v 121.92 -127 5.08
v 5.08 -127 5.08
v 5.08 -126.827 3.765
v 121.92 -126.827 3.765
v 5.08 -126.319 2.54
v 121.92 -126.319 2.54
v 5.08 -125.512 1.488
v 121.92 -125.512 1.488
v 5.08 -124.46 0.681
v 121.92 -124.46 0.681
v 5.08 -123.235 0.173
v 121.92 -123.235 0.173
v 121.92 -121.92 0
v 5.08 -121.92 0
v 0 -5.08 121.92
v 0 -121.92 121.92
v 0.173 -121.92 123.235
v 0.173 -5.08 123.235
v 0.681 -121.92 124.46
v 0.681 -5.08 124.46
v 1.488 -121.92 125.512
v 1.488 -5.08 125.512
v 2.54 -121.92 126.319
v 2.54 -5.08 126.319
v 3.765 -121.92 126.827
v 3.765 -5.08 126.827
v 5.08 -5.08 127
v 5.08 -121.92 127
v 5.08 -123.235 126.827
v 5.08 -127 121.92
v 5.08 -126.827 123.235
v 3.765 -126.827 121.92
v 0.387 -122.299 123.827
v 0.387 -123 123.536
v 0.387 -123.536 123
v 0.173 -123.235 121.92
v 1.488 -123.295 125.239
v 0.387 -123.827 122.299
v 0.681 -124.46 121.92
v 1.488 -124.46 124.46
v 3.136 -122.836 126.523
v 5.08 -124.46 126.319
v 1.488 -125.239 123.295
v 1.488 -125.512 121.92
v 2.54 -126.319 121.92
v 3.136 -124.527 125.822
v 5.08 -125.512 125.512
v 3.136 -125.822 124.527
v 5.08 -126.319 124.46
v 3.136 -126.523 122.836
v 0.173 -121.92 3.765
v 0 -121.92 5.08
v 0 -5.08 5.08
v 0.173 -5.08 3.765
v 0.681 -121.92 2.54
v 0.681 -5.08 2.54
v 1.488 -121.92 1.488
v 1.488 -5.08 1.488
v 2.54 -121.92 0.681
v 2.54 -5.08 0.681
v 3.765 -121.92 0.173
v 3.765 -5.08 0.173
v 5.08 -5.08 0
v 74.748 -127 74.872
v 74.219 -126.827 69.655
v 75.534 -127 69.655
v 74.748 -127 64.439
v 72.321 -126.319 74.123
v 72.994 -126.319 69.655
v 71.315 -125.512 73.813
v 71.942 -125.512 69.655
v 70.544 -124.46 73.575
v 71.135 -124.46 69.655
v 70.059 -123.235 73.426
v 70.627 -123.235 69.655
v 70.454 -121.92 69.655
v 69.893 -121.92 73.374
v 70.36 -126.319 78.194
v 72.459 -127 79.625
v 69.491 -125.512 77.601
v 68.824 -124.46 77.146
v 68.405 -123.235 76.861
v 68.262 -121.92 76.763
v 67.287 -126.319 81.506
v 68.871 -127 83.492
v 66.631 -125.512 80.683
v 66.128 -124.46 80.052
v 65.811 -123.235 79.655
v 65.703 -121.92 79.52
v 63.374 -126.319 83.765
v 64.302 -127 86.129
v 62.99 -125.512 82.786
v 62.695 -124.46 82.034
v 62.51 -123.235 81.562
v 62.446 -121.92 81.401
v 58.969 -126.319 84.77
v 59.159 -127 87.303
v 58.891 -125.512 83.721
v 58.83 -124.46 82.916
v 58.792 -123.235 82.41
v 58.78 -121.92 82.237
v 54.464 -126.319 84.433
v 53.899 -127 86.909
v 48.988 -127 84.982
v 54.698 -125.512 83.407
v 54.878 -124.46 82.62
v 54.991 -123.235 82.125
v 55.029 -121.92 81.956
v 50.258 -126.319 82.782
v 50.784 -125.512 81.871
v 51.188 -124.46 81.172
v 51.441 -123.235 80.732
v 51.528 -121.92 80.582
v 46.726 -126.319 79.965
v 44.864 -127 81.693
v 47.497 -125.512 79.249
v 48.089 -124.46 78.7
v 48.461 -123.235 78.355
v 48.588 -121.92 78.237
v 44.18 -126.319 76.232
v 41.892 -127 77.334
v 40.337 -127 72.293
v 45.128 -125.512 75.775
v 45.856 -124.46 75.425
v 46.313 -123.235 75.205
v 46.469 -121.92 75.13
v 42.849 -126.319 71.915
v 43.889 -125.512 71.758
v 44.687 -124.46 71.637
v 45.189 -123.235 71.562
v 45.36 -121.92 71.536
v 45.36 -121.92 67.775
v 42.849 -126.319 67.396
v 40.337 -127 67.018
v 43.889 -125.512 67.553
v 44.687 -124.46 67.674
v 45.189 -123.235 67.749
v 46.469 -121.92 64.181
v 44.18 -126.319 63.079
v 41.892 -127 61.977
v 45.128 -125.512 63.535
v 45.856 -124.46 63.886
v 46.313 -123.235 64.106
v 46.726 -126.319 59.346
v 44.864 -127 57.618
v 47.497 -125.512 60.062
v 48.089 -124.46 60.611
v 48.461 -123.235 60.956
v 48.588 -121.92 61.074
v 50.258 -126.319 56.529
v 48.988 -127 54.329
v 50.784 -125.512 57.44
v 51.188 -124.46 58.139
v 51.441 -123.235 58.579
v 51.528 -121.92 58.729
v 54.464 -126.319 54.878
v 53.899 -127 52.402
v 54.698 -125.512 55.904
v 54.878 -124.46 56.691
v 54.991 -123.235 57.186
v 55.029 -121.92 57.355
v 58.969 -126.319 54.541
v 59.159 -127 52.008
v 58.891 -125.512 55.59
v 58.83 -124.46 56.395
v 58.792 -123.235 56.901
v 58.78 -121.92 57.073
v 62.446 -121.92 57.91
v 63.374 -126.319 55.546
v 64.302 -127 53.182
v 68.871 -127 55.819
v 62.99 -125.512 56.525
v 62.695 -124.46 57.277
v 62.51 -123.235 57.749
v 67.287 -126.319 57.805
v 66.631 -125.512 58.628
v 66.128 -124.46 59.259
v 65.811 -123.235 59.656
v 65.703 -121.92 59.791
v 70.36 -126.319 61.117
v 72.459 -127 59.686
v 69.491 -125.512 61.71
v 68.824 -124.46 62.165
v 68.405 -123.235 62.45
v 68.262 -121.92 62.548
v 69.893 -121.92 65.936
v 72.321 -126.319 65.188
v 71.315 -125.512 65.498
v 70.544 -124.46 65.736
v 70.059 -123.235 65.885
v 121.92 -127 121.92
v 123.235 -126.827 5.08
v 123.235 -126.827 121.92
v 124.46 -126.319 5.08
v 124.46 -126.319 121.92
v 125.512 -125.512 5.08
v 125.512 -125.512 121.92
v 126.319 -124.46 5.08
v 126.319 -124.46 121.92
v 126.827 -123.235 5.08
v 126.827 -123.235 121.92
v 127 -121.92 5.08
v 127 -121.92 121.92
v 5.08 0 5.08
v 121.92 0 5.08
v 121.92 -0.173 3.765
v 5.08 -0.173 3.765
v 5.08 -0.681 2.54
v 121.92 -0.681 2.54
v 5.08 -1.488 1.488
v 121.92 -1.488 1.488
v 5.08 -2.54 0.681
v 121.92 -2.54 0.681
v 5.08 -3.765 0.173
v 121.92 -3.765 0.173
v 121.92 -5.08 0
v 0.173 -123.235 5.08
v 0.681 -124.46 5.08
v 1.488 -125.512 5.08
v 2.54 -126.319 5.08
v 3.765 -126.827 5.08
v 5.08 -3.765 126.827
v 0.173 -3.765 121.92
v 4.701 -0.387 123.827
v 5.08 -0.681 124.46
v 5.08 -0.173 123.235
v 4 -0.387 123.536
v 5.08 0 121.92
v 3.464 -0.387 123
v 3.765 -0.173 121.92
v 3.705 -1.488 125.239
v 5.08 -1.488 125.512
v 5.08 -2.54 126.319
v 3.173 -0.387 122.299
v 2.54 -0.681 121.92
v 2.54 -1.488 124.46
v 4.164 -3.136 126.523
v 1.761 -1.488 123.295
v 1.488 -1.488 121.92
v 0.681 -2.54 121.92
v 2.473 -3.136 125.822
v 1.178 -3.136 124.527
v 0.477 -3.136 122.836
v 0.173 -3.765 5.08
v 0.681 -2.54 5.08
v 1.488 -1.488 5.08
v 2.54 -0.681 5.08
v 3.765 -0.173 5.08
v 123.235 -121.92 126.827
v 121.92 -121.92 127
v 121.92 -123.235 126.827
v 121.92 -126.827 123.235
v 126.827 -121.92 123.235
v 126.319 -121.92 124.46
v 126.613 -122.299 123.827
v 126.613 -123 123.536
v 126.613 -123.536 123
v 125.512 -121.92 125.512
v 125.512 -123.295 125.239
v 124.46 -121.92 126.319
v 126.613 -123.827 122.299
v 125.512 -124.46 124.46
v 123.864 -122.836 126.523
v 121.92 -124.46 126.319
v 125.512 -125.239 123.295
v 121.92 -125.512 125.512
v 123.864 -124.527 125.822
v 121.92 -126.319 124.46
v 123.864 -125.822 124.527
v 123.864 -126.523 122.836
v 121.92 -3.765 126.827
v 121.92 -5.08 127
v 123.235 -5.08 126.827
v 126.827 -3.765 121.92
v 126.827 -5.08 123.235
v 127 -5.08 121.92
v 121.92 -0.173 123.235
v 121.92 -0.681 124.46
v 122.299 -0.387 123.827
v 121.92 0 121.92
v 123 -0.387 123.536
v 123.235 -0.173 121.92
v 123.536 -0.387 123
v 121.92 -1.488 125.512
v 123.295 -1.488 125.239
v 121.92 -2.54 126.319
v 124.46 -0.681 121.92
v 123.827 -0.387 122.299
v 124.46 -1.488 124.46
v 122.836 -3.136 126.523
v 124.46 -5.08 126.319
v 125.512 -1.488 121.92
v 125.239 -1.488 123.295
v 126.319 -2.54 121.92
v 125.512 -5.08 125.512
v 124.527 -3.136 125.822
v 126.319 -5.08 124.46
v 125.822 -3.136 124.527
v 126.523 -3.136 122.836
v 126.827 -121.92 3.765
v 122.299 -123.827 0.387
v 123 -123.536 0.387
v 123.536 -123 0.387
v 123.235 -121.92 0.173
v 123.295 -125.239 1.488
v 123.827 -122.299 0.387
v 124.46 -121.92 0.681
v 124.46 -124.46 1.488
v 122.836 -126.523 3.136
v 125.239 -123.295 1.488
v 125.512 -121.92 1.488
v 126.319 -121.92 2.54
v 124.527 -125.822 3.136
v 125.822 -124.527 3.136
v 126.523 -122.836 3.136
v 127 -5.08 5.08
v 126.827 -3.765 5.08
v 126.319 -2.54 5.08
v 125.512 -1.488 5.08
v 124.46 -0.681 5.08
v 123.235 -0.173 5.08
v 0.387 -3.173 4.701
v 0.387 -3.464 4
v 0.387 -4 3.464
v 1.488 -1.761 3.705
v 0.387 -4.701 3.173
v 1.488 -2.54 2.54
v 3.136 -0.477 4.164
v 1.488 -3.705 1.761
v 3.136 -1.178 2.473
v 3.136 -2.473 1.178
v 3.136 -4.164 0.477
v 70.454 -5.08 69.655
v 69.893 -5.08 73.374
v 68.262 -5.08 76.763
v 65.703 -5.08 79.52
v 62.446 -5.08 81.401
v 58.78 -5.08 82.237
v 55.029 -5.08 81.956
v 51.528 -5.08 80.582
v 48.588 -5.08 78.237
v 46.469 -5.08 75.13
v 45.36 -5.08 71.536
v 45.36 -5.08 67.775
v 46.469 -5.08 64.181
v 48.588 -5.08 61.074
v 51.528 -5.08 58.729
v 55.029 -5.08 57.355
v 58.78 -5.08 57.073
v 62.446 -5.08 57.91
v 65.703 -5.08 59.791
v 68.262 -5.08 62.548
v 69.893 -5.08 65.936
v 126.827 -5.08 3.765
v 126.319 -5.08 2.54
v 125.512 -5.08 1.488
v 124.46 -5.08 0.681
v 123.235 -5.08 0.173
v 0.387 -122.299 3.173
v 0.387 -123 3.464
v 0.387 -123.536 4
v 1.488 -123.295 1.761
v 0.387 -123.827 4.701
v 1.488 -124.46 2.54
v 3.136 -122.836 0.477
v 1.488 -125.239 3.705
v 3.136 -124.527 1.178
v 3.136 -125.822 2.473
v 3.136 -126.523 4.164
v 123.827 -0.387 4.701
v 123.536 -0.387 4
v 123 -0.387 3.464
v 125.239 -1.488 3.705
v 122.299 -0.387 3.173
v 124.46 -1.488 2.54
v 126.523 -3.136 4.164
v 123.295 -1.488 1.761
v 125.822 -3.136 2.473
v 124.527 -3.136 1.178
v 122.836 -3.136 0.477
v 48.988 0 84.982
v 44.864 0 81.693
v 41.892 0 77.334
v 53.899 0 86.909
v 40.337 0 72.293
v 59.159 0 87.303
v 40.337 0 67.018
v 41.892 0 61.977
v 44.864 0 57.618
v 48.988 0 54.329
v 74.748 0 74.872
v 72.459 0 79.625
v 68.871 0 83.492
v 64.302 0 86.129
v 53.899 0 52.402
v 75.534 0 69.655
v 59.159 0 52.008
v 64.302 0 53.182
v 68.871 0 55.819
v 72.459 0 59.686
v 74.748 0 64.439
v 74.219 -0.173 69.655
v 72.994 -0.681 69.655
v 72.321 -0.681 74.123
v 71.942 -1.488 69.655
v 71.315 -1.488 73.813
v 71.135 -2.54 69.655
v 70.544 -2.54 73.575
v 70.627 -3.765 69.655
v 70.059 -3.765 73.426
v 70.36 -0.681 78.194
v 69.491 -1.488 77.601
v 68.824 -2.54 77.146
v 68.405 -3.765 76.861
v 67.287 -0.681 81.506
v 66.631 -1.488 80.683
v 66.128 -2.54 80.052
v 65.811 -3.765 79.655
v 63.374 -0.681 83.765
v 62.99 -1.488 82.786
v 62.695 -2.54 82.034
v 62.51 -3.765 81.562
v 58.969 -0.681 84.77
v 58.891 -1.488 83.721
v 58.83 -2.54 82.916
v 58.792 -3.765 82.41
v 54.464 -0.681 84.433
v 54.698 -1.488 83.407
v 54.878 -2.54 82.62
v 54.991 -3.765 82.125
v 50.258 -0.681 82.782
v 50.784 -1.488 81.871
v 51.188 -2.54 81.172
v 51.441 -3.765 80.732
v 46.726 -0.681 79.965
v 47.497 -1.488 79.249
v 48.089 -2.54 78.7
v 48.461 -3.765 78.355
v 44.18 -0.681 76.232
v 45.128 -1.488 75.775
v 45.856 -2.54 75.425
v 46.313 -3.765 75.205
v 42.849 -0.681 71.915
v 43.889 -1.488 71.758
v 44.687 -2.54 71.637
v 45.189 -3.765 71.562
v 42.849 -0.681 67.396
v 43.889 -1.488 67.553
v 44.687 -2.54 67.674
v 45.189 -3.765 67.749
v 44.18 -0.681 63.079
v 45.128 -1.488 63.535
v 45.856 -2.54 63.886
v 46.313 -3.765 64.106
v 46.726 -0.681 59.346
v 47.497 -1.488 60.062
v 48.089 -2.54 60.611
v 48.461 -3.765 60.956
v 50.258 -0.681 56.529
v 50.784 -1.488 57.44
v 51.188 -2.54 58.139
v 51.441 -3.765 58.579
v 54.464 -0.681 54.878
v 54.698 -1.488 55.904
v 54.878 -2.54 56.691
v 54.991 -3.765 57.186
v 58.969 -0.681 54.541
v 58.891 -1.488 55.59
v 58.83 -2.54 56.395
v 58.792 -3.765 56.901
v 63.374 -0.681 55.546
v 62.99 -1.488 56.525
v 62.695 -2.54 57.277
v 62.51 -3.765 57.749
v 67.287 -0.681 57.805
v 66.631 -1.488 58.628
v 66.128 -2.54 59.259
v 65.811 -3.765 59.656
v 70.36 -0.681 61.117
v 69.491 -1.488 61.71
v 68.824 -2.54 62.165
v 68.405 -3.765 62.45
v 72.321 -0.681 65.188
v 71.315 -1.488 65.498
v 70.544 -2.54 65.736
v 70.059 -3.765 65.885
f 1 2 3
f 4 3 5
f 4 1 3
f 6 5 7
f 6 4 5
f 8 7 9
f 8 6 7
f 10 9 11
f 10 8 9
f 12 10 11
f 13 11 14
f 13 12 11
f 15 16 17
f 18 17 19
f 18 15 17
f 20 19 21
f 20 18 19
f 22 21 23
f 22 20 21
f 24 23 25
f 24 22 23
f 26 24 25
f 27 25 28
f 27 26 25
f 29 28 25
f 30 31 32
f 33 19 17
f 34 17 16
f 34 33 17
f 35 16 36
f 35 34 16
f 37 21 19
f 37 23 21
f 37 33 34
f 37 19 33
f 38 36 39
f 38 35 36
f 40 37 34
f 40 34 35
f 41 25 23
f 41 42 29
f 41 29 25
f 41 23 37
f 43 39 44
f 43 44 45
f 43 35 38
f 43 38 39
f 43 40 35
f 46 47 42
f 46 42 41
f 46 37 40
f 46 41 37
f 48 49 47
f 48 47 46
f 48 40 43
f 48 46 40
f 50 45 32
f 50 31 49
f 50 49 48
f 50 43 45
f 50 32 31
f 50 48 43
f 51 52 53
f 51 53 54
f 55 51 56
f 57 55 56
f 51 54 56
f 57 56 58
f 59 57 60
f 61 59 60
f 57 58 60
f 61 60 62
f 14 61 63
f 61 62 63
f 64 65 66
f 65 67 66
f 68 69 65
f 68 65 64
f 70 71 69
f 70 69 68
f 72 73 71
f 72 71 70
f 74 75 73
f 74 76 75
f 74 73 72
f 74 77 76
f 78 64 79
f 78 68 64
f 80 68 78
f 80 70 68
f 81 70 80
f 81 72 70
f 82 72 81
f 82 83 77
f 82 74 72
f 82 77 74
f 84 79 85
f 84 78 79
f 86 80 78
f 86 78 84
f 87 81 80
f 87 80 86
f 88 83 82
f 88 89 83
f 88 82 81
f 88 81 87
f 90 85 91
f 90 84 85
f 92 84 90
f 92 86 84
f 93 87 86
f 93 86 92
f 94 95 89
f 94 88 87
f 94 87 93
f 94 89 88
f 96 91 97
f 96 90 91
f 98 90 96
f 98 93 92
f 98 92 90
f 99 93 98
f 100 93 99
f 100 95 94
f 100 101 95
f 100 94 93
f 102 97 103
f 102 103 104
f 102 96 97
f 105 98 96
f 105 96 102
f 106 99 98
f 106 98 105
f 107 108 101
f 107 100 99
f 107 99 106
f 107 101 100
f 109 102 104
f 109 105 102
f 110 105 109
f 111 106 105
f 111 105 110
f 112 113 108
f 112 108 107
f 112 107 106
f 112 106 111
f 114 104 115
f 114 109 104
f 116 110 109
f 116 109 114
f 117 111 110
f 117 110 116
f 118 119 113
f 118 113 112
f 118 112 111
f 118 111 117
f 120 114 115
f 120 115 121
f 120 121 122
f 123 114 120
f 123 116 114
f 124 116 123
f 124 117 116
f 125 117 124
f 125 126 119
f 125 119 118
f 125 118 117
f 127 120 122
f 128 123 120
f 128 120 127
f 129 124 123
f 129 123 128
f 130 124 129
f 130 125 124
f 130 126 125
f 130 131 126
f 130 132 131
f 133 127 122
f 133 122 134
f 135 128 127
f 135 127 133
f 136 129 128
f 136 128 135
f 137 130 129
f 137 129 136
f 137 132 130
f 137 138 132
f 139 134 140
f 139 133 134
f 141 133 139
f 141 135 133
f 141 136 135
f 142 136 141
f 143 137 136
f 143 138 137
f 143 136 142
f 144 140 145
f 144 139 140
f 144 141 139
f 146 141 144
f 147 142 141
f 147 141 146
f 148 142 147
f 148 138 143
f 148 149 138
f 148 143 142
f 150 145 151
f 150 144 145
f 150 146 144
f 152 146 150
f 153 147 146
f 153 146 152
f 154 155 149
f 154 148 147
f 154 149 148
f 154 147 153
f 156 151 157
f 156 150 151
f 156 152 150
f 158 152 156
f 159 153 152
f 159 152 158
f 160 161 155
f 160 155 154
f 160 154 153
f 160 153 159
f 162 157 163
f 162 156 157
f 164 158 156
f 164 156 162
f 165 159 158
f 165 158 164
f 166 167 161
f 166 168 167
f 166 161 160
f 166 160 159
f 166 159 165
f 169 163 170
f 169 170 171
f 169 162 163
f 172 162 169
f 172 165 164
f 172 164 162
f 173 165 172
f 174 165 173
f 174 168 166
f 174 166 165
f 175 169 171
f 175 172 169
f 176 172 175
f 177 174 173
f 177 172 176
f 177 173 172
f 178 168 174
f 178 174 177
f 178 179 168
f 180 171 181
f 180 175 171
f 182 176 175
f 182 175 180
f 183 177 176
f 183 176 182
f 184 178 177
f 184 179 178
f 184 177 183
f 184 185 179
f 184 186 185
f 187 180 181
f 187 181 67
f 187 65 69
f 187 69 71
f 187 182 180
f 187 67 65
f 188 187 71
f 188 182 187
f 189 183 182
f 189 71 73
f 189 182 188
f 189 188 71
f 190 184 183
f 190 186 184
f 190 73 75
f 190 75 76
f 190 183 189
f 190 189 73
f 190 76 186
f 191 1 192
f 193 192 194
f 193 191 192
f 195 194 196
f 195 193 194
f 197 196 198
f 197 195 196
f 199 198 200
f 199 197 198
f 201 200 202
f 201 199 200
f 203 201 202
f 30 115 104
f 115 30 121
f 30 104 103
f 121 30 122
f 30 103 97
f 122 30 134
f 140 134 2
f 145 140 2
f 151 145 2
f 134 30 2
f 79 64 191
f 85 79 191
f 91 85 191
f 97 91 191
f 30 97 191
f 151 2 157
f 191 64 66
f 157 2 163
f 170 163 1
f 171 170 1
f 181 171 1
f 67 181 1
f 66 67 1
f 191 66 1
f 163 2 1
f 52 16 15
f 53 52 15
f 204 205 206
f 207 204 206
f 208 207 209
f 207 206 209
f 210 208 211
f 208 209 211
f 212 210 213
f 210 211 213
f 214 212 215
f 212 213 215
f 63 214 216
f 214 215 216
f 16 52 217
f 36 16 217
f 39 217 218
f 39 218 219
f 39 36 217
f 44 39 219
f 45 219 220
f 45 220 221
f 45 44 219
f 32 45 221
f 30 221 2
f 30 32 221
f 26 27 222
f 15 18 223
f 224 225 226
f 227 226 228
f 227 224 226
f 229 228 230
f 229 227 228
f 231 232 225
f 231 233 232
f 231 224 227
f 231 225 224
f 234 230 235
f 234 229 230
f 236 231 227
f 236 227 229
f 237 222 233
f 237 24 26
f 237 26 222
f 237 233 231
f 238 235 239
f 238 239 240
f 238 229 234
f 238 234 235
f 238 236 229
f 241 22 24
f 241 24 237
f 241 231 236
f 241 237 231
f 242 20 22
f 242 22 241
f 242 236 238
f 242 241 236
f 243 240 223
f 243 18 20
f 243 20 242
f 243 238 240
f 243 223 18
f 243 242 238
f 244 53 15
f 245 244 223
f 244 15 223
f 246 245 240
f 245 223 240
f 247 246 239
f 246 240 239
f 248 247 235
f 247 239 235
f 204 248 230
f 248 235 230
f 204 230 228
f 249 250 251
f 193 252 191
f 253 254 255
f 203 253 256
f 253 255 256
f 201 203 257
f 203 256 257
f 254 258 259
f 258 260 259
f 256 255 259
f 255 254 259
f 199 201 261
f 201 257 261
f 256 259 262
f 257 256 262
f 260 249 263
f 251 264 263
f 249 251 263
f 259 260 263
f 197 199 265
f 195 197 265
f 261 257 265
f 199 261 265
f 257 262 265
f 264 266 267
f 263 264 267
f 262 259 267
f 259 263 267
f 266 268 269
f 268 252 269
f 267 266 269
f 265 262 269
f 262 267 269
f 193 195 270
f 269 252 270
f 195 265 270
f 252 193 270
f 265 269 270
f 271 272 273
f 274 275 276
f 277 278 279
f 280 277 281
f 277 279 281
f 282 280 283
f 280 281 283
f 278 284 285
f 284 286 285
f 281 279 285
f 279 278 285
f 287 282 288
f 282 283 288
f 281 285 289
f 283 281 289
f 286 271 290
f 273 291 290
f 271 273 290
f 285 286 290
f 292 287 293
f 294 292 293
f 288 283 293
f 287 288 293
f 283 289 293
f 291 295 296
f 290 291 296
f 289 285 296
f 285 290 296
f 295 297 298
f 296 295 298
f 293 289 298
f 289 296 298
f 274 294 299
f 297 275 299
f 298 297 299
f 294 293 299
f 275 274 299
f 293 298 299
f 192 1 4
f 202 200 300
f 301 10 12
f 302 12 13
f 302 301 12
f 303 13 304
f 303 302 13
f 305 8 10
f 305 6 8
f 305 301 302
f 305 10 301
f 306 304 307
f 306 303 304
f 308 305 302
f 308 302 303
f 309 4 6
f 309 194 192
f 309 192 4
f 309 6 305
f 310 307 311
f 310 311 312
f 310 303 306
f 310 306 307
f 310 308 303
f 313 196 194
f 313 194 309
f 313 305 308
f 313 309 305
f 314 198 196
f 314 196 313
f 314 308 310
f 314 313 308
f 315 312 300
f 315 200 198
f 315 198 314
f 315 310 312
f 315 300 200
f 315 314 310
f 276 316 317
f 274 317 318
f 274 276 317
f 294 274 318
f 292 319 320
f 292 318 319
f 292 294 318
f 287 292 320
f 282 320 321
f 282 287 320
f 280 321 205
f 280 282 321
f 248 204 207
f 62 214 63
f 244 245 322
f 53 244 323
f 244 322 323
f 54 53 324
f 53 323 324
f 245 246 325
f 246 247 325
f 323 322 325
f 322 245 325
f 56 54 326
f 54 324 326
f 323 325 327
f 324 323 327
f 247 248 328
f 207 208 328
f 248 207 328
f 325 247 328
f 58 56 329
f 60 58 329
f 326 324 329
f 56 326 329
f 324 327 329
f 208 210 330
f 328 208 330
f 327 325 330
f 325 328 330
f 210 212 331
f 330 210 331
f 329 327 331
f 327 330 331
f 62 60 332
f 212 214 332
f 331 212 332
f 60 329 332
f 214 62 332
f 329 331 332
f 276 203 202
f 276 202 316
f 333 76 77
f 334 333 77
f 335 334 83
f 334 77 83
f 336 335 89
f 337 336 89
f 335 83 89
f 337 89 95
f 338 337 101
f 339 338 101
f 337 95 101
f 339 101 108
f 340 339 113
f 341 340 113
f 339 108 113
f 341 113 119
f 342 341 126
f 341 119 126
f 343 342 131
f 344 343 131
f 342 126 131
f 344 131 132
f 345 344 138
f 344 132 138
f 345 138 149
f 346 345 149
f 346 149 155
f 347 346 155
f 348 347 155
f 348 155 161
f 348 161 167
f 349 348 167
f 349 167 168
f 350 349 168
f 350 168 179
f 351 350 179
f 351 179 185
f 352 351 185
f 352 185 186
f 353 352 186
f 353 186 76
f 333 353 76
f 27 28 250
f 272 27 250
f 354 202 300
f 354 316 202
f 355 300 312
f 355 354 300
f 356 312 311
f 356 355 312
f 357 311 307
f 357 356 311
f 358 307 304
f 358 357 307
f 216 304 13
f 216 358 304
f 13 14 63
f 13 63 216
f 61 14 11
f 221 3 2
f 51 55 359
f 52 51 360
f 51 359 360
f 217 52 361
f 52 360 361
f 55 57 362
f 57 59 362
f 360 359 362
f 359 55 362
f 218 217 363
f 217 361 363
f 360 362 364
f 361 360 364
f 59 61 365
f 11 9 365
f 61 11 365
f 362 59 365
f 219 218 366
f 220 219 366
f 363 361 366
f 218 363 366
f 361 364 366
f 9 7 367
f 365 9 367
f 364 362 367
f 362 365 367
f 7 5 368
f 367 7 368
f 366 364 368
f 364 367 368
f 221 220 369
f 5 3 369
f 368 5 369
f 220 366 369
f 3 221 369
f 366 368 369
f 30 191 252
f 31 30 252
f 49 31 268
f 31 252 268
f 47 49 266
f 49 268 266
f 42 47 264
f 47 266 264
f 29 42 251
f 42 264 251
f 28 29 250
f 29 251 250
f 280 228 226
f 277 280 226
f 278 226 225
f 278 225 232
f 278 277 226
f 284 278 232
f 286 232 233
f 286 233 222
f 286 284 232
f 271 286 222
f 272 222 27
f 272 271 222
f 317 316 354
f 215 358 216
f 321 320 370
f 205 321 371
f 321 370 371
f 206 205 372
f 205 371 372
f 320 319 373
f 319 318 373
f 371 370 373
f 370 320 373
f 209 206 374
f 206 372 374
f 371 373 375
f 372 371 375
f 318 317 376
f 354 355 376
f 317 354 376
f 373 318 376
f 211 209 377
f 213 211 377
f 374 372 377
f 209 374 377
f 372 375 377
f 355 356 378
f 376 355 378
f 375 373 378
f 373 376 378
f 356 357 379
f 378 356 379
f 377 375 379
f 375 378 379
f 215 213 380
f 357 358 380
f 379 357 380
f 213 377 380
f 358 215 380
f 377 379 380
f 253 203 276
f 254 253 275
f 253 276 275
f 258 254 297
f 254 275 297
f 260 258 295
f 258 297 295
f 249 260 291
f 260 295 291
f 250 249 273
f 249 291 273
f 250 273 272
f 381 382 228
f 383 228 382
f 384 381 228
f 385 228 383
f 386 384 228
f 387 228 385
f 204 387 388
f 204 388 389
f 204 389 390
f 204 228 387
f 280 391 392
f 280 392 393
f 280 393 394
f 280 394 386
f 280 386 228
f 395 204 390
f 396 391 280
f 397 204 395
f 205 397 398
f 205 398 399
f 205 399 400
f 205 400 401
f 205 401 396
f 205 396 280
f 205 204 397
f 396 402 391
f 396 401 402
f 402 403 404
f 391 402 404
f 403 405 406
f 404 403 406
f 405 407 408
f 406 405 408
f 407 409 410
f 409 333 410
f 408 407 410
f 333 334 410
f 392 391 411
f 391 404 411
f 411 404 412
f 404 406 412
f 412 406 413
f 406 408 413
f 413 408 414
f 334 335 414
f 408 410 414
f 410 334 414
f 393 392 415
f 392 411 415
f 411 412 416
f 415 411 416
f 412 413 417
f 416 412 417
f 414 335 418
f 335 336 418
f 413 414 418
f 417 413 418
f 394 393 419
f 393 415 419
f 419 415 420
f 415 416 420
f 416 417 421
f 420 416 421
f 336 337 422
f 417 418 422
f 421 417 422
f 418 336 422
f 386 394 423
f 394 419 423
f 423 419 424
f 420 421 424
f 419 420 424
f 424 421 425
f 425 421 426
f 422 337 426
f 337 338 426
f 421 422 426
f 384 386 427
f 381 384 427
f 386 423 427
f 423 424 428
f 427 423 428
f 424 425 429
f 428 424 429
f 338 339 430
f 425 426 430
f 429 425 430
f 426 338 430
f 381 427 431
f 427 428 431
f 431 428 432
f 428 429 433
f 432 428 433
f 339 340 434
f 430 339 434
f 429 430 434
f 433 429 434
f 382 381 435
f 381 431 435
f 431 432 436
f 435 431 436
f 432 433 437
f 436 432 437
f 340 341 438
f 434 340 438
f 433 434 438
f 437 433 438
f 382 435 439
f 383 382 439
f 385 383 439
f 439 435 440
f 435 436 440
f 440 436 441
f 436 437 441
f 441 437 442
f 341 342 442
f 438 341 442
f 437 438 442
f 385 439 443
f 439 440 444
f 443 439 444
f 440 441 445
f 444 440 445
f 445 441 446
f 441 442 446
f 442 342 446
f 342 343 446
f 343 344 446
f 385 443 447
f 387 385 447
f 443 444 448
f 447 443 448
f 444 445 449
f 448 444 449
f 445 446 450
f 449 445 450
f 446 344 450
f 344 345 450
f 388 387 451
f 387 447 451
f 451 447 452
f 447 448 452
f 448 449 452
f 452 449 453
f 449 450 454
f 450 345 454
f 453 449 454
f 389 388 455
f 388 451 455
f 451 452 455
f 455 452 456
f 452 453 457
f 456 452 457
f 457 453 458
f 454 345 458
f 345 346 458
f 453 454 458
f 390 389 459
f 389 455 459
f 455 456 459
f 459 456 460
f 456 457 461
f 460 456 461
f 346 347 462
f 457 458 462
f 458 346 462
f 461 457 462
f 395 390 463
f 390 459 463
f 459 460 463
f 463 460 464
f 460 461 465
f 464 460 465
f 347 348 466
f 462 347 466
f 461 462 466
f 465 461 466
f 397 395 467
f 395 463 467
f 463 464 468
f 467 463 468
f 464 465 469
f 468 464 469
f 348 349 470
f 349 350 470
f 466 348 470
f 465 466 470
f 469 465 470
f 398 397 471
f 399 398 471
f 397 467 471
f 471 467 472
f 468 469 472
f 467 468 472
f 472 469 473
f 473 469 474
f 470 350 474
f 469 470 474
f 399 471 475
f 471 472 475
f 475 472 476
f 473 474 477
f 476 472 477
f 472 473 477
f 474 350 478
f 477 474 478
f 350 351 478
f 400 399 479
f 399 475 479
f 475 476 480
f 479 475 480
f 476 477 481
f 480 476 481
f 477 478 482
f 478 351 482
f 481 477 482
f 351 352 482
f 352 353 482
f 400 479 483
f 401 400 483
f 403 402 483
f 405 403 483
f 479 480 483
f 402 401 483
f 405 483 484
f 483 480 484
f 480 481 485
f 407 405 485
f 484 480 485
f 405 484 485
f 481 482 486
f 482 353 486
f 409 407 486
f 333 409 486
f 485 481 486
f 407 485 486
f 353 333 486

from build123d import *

# Parameters (mm, degrees)
F0_W     = 127
F0_H     = 127
F1_DEPTH = 127
F2_R     = 5.08
F3_R     = 12.617279
F4_DEPTH = 127.001
F5_R     = 5.08


with BuildPart() as f1:
    # F0 (on Top) → F1 (new body)
    with BuildSketch(Plane.XY):
        with Locations((63.5, -63.5)):
            Rectangle(F0_W, F0_H)
    extrude(amount=F1_DEPTH)

    # F2
    f2_edges = [f1.edges().sort_by_distance(p)[0] for p in [
        (63.5, -127, 127),
        (127, -63.5, 127),
        (0, -63.5, 127),
        (63.5, 0, 127),
        (127, -127, 63.5),
        (63.5, -127, 0),
        (127, -63.5, 0),
        (127, 0, 63.5),
        (63.5, 0, 0),
        (0, 0, 63.5),
        (0, -63.5, 0),
        (0, -127, 63.5),
    ]]
    fillet(f2_edges, radius=F2_R)

    # F3 (on face) → F4 (cut, through all)
    with BuildSketch(Plane.XZ.offset(127)):
        with Locations((57.836652, 69.655485)):
            Circle(F3_R)
    extrude(amount=-F4_DEPTH, mode=Mode.SUBTRACT)

    # F5
    f5_edges = [f1.edges().sort_by_distance(p)[0] for p in [
        (45.219373, -127, 69.655485),
        (45.219373, 0, 69.655485),
    ]]
    fillet(f5_edges, radius=F5_R)


solid = f1.part
